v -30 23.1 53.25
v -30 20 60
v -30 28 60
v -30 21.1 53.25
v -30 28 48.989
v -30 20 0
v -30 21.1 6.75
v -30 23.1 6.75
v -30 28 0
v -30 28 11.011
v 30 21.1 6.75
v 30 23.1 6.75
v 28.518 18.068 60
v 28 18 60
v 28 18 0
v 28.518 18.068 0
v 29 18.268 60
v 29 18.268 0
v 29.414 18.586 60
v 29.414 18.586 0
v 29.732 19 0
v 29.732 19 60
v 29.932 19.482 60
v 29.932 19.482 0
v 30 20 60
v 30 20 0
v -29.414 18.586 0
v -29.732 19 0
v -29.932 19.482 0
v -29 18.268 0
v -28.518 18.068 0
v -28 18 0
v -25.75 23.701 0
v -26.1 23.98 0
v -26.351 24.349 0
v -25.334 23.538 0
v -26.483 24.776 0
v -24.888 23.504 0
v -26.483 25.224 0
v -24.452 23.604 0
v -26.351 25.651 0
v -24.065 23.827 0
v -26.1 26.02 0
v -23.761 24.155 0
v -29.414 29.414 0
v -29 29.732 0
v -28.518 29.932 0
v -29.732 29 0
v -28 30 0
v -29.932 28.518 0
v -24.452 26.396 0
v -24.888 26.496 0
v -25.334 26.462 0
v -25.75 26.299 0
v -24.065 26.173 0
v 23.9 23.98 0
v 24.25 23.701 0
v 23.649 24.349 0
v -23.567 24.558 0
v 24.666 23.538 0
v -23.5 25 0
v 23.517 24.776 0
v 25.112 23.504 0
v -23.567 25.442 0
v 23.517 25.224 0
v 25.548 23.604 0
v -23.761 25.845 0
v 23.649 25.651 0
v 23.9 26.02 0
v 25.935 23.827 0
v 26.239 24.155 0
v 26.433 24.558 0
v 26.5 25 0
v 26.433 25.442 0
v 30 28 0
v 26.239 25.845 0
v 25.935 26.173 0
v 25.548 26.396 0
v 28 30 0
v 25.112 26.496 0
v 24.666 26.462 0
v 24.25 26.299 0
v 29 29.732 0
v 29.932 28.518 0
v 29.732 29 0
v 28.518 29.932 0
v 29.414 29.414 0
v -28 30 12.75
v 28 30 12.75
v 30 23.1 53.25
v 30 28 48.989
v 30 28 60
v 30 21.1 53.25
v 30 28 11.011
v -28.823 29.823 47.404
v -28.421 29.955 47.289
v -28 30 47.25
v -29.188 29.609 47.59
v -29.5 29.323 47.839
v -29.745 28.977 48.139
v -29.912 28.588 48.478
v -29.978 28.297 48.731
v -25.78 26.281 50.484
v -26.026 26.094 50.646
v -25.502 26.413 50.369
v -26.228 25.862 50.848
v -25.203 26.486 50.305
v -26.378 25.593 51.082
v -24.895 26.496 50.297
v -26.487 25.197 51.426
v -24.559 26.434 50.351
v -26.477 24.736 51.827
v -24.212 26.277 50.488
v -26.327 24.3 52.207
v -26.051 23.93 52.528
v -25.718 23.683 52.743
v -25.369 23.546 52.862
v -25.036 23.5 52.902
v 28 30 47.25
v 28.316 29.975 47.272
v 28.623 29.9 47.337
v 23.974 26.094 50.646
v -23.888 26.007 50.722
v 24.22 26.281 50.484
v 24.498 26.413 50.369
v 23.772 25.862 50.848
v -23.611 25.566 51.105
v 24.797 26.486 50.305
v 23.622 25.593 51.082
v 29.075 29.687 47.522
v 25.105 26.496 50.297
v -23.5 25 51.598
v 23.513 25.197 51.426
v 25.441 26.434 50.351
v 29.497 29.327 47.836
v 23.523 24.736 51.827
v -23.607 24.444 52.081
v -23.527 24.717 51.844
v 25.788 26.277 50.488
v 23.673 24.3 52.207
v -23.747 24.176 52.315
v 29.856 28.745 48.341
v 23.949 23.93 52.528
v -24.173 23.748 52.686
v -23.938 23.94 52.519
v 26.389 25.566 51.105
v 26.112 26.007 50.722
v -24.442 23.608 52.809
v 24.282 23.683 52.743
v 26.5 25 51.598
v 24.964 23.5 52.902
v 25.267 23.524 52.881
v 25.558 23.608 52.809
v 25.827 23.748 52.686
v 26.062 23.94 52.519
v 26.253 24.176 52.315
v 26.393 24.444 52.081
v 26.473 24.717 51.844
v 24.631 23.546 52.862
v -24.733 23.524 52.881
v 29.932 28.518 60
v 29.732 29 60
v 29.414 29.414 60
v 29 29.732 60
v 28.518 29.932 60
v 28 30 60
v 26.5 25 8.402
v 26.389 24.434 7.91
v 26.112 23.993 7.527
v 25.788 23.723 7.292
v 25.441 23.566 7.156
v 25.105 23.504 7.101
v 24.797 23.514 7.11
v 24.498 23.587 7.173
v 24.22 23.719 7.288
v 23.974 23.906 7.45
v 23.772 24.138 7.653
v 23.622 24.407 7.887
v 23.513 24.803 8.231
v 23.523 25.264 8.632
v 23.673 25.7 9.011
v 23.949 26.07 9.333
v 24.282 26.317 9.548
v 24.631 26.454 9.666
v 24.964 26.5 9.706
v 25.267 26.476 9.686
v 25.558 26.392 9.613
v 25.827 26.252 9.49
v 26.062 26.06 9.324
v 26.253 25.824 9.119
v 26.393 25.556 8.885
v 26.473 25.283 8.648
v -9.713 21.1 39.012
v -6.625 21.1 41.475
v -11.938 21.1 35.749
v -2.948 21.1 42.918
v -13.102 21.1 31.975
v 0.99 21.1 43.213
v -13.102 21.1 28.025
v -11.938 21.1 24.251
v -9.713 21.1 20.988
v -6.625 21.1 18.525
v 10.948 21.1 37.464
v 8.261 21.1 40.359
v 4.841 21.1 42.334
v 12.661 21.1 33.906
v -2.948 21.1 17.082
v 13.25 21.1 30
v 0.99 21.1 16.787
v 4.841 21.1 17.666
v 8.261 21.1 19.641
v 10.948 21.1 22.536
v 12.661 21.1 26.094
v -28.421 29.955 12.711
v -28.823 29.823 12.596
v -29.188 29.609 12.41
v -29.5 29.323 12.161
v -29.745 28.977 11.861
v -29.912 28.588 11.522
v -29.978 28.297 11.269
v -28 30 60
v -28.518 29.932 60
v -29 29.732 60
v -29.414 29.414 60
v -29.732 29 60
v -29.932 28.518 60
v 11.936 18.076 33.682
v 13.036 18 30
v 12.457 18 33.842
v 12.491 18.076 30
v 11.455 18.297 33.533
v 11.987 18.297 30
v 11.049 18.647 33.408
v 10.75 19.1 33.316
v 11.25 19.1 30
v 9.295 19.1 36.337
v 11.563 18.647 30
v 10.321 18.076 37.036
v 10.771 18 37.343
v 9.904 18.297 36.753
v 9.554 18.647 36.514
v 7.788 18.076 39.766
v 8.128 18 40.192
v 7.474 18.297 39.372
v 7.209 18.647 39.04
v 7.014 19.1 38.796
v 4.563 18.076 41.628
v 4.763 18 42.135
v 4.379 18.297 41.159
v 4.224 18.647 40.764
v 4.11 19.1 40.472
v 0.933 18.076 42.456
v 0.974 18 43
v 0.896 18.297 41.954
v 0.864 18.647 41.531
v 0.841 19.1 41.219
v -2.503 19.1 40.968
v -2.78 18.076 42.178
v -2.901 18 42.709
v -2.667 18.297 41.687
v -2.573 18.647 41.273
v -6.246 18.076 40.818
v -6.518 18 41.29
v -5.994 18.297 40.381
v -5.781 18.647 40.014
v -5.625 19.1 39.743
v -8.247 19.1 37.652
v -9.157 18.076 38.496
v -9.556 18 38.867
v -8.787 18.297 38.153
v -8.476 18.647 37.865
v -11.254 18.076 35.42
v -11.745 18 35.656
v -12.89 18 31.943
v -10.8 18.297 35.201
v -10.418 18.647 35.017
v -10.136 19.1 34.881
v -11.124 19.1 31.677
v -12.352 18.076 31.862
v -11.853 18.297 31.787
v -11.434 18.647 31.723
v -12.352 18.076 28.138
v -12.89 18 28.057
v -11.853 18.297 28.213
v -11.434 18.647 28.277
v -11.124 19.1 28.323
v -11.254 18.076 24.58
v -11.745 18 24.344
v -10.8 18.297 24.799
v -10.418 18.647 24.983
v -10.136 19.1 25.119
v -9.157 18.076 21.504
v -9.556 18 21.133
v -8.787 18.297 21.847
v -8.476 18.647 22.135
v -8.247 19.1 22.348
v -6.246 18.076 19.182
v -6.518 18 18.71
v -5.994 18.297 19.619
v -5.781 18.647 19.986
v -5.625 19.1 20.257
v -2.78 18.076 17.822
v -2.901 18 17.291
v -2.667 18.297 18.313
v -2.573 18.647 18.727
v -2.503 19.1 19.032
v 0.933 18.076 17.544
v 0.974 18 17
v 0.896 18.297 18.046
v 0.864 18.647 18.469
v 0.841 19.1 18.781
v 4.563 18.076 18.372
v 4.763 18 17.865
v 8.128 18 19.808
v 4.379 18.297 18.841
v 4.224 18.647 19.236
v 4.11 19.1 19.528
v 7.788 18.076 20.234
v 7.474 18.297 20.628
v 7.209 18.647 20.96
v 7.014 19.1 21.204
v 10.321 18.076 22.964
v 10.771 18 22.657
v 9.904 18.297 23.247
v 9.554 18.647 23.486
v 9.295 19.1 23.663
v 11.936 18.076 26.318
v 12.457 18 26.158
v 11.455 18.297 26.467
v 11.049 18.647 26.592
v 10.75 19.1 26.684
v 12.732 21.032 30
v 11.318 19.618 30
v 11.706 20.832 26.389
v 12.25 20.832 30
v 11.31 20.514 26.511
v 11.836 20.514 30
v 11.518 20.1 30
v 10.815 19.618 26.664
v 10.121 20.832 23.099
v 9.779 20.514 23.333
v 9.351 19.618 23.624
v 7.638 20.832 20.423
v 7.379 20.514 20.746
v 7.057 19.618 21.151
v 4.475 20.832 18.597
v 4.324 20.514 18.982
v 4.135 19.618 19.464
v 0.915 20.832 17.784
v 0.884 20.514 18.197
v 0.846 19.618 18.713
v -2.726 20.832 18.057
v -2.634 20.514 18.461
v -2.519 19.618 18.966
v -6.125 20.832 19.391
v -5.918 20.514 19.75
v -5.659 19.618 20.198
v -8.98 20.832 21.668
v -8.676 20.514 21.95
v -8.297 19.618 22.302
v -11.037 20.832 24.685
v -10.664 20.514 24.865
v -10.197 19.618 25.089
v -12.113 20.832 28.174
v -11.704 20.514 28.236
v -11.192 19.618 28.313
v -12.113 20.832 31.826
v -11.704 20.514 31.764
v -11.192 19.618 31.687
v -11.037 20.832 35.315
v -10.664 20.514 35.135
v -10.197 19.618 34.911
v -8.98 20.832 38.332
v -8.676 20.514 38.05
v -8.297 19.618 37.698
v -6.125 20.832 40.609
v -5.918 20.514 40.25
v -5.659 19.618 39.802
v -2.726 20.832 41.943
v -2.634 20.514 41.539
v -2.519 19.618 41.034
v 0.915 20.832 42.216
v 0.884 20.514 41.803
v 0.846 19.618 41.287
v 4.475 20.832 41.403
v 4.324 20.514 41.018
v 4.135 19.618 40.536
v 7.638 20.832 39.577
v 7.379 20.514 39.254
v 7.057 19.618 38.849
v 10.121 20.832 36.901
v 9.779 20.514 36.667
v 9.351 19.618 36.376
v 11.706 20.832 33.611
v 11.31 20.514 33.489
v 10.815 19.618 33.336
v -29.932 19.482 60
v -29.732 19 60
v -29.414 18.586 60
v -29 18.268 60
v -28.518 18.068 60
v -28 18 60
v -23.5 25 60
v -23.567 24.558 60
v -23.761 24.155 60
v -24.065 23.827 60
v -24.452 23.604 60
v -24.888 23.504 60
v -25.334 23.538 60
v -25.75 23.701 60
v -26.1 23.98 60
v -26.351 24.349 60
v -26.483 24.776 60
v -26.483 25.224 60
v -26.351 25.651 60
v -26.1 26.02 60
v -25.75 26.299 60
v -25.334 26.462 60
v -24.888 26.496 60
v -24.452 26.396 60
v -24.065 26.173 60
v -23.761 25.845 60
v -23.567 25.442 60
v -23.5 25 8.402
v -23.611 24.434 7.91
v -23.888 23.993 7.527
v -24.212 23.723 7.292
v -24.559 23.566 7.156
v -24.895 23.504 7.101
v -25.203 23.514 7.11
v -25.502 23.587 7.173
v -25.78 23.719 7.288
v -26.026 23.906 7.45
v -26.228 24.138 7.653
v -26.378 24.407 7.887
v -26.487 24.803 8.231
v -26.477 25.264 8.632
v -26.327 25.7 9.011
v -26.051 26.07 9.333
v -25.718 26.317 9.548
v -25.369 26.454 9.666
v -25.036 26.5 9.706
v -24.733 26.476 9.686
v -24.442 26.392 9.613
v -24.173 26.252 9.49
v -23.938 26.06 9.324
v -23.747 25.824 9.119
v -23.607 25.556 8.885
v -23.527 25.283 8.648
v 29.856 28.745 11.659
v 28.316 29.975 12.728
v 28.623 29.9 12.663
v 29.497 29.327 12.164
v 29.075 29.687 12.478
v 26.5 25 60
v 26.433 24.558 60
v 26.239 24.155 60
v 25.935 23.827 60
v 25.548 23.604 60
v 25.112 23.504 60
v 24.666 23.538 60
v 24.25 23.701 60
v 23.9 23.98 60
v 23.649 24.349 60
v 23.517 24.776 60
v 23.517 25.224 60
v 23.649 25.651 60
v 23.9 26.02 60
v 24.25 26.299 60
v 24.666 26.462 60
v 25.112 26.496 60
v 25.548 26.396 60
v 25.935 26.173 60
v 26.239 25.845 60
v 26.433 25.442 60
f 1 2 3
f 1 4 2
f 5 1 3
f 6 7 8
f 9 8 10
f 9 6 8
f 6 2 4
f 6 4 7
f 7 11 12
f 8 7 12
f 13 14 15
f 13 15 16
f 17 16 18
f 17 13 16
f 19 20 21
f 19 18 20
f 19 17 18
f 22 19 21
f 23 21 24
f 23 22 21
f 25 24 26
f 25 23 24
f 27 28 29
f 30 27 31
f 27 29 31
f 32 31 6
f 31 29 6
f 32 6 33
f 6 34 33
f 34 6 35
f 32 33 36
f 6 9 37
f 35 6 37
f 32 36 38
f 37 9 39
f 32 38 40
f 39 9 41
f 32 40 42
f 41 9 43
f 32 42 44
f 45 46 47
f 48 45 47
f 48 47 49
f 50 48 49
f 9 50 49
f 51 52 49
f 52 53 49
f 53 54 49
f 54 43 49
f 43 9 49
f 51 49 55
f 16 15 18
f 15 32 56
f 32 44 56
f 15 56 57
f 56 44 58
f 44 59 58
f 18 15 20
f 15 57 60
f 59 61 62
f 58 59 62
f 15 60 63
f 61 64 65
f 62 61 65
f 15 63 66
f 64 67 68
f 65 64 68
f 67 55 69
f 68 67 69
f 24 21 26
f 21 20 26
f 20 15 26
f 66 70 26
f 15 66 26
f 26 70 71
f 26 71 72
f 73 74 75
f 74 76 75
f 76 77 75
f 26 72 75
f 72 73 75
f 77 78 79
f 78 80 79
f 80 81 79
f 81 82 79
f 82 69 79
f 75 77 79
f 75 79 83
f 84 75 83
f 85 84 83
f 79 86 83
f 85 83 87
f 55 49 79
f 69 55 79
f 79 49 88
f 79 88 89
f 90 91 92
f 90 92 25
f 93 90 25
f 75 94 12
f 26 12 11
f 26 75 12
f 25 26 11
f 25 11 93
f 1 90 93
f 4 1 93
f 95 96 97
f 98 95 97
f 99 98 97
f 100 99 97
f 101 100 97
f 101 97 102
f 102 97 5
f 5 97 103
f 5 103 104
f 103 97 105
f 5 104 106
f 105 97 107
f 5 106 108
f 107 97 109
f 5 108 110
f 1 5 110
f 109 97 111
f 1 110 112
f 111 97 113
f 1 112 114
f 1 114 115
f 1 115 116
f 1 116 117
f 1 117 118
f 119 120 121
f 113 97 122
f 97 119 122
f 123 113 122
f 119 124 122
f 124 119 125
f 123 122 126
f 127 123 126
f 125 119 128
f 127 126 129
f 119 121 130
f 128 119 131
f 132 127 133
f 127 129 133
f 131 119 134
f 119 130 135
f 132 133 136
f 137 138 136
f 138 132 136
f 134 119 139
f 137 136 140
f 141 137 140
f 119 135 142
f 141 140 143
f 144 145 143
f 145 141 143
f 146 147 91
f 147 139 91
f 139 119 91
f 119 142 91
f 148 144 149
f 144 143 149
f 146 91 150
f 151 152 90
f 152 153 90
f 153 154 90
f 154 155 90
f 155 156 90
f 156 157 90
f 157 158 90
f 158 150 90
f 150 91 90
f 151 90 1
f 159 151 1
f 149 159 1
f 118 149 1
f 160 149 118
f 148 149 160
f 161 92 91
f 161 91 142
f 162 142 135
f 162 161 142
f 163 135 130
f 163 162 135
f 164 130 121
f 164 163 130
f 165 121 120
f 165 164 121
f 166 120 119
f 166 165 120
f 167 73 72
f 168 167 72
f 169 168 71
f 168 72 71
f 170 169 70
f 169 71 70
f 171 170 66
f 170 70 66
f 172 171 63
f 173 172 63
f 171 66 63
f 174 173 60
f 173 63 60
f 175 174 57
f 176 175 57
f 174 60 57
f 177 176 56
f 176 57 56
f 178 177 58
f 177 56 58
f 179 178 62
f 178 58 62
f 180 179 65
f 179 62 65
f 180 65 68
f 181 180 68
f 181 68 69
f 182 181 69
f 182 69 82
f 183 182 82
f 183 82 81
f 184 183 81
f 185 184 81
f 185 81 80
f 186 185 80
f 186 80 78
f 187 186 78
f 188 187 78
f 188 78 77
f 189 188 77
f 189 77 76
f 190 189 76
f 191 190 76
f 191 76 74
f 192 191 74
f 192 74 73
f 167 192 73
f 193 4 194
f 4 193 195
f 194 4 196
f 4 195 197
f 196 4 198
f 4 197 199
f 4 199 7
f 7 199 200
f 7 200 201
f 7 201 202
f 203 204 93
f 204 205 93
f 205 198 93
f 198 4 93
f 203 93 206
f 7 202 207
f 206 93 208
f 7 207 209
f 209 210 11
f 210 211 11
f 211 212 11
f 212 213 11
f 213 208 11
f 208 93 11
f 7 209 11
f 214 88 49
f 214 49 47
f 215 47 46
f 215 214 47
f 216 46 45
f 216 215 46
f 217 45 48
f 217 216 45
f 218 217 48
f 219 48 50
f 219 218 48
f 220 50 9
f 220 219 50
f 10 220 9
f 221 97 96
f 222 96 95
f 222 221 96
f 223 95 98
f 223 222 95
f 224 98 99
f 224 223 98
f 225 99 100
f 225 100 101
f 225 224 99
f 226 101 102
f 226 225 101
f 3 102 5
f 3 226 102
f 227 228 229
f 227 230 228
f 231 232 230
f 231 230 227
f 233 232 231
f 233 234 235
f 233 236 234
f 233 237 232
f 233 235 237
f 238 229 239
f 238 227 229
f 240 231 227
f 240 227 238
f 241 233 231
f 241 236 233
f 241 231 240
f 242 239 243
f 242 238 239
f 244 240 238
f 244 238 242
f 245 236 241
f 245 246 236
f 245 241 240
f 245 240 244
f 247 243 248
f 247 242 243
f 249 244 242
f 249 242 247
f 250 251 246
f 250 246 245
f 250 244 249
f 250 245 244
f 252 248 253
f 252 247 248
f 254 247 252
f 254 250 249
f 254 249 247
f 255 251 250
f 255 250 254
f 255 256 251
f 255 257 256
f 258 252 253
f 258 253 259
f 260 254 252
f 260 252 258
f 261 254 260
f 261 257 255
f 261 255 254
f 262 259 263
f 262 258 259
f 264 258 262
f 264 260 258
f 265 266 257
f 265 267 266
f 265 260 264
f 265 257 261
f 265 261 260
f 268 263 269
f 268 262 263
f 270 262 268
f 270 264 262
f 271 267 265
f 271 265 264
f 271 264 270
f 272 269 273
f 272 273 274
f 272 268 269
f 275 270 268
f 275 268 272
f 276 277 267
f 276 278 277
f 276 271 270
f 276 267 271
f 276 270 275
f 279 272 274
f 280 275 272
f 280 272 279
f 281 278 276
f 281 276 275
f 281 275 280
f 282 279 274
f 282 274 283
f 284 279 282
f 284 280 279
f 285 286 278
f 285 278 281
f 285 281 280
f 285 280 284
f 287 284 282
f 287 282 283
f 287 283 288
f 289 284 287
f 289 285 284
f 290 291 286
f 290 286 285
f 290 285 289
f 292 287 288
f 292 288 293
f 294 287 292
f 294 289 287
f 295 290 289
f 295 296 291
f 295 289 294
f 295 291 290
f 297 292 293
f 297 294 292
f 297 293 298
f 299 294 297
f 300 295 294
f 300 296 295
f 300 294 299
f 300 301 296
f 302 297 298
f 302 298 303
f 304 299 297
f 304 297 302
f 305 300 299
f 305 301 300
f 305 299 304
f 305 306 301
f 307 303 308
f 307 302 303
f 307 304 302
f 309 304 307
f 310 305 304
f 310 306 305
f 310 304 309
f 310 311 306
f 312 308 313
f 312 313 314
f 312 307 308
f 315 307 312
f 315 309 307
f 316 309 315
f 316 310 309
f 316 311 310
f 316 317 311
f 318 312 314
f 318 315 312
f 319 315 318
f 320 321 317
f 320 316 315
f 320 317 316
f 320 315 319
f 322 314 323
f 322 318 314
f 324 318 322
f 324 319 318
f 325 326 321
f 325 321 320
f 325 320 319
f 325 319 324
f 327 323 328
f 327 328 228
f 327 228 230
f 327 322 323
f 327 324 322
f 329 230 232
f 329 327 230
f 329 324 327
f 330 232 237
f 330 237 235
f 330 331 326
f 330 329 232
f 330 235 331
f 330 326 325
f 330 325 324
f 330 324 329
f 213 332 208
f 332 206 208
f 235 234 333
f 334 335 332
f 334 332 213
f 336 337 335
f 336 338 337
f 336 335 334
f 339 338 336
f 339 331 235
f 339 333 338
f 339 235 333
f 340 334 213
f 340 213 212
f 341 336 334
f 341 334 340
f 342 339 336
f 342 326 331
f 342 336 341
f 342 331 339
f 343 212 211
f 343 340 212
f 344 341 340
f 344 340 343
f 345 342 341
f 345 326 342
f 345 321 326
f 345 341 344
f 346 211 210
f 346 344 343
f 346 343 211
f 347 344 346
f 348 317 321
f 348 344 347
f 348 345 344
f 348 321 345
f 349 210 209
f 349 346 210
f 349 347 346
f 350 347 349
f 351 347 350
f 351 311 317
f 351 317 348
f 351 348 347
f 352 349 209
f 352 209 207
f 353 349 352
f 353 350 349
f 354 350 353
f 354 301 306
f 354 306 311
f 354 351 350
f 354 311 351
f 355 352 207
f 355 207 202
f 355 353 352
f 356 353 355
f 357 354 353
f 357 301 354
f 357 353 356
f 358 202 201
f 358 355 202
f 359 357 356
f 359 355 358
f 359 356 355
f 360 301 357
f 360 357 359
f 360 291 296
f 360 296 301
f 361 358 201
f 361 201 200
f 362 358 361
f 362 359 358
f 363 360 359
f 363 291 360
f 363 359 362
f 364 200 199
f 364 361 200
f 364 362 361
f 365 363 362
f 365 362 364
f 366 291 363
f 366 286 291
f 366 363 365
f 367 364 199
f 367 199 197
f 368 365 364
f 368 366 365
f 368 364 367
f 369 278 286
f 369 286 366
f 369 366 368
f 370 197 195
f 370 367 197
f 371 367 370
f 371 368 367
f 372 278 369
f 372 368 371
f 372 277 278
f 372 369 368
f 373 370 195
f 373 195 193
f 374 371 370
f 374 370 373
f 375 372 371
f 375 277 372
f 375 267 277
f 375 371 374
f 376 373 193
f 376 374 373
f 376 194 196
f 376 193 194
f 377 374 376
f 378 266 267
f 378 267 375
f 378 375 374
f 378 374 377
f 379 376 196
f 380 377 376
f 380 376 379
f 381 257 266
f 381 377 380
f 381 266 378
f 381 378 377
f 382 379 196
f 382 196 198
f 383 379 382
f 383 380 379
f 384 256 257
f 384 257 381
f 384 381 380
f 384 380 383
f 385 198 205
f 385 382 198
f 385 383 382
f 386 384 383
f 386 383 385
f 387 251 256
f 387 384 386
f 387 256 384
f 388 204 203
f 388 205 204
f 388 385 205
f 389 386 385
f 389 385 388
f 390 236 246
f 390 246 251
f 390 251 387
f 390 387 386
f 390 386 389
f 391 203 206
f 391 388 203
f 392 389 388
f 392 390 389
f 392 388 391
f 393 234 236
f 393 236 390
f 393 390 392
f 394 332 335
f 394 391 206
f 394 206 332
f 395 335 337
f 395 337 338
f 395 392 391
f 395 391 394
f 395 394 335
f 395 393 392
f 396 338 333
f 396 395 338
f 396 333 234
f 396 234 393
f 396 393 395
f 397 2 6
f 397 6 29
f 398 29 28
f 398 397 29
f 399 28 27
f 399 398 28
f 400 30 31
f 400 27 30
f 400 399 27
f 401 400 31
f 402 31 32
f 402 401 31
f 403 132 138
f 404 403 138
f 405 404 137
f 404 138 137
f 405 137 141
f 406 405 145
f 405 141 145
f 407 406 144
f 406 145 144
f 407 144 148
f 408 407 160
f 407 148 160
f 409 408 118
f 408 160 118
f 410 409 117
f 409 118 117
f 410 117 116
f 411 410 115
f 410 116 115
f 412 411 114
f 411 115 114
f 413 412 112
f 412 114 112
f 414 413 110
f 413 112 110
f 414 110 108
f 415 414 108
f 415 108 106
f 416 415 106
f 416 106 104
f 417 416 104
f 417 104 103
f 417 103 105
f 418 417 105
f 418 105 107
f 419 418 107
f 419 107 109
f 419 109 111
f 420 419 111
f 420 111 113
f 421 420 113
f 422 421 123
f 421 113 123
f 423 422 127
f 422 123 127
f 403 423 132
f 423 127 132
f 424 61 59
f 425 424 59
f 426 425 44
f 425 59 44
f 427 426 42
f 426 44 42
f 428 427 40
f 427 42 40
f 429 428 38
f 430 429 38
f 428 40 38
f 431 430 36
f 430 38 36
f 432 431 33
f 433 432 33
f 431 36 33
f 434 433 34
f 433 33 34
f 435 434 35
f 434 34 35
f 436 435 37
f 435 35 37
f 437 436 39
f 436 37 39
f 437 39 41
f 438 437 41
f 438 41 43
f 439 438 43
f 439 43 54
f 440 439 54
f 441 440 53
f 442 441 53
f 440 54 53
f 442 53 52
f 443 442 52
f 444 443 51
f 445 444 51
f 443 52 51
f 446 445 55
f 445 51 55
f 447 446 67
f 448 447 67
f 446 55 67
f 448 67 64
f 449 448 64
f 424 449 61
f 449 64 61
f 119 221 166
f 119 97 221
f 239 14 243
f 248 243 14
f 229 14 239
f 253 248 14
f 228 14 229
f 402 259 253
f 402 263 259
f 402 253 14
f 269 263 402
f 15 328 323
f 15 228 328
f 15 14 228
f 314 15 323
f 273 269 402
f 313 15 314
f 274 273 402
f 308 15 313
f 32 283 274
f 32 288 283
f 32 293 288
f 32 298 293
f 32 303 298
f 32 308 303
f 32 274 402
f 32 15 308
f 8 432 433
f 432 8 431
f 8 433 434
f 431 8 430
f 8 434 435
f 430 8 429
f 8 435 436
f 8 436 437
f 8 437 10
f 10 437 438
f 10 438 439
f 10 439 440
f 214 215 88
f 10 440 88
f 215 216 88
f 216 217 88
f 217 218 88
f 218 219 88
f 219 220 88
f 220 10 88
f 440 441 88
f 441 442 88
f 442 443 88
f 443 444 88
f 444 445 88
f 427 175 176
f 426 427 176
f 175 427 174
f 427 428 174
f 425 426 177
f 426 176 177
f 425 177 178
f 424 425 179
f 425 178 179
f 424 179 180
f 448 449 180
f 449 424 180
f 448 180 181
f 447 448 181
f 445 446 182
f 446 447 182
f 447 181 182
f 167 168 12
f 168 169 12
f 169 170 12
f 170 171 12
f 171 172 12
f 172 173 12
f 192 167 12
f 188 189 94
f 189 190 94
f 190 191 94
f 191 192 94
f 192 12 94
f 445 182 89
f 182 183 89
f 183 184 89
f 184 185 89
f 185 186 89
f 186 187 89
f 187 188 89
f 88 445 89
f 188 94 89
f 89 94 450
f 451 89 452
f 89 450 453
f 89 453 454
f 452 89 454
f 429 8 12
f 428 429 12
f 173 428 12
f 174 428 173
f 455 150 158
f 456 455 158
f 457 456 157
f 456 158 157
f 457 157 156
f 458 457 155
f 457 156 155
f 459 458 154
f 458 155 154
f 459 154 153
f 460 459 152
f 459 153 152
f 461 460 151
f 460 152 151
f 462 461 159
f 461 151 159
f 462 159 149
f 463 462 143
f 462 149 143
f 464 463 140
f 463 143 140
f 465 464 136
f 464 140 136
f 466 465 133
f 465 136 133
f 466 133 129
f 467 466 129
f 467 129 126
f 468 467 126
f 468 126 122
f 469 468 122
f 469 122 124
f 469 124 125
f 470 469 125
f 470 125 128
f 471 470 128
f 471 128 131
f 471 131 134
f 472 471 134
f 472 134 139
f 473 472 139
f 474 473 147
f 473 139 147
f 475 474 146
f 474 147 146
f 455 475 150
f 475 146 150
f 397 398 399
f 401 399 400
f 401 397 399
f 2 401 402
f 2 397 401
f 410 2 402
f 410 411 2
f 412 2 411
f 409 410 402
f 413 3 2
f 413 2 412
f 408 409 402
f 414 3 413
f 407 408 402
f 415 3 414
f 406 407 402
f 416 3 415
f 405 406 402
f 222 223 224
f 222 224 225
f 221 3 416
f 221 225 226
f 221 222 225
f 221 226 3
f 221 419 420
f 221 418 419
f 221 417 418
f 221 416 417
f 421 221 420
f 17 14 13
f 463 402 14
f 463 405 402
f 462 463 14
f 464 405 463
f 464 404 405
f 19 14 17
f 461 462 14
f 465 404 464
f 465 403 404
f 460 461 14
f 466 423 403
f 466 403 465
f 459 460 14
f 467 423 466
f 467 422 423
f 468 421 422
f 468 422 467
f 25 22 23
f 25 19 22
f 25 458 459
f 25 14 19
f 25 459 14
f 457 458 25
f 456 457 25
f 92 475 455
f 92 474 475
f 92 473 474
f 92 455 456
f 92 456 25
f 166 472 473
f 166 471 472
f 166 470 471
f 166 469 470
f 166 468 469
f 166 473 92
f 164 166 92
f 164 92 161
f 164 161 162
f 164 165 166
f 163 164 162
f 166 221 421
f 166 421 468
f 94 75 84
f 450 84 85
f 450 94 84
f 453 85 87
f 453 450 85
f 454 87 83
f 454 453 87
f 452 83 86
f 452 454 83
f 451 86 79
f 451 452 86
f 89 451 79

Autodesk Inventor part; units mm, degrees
ref_plane "YZ Plane" through (0, 0, 0) normal (1, 0, 0) x (0, 1, 0)
ref_plane "XZ Plane" through (0, 0, 0) normal (0, 1, 0) x (-1, 0, 0)
ref_plane "XY Plane" through (0, 0, 0) normal (0, 0, 1) x (1, 0, 0)
sketch "Sketch1" plane through (0, 0, 0) normal (0, 0, 1) x (1, 0, 0)
  line L0 (30, -30) -> (30, 30)
  line L1 (30, 30) -> (-30, 30)
  line L2 (-30, 30) -> (-30, -30)
  line L3 (-30, -30) -> (30, 30) construction
  line L4 (30, -30) -> (-30, 30) construction
  line L5 (30, 30) -> (25, 30) construction
  line L6 (25, 30) -> (25, 25) construction
  line L7 (-30, 30) -> (-25, 30) construction
  line L8 (-25, 30) -> (-25, 25) construction
  line L9 (-30, -30) -> (-30, -25) construction
  line L10 (-30, -25) -> (-25, -25) construction
  line L11 (30, -30) -> (30, -25) construction
  line L12 (30, -25) -> (25, -25) construction
  circle A0 centre (-25, 25) radius 1.5
  circle A1 centre (25, 25) radius 1.5
  circle A2 centre (25, -25) radius 1.5
  circle A3 centre (-25, -25) radius 1.5
  line L13 (30, 30) -> (30, 18) construction
  line L14 (30, 18) -> (-30, 18)
  point P0 (0, 0)
  dimension "d0" = 60
  dimension "d1" = 60
  dimension "d2" = 5
  dimension "d3" = 5
  dimension "d4" = 5
  dimension "d5" = 5
  dimension "d6" = 5
  dimension "d7" = 5
  dimension "d8" = 5
  dimension "d9" = 5
  dimension "d10" = 3
  dimension "d11" = 3
  dimension "d12" = 3
  dimension "d13" = 3
  dimension "d46" = 12
sketch "Sketch1 outline for Block" plane through (0, 0, 0) normal (0, 0, 1) x (1, 0, 0)
  line L0 (30, 30) -> (30, 18)
  line L1 (-30, 30) -> (30, 30)
  line L2 (30, 18) -> (-30, 18)
  line L3 (-30, 18) -> (-30, 30)
  circle A0 centre (-25, 25) radius 1.5
  circle A1 centre (25, 25) radius 1.5
extrude "Block" add sketch "Sketch1 outline for Block" along normal blind 60
sketch "Sketch2" plane through (30, -30, 0) normal (1, 0, 0) x (0, 0, -1)
  line L0 (0, 60) -> (-60, 60) projected
  line L1 (-30, 60) -> (-12.75, 60)
  line L2 (-30, 60) -> (-47.25, 60)
  line L3 (-30, 60) -> (-30, 51.1) construction
  line L4 (-30, 51.1) -> (-6.75, 51.1)
  line L5 (-30, 51.1) -> (-53.25, 51.1)
  line L6 (-53.25, 51.1) -> (-53.25, 53.1)
  line L7 (-6.75, 51.1) -> (-6.75, 53.1)
  line L8 (-6.75, 53.1) -> (-12.75, 60)
  line L9 (-53.25, 53.1) -> (-47.25, 60)
  point P0 (0, 30)
  dimension "d17" = 17.25
  dimension "d18" = 17.25
  dimension "d19" = 8.9
  dimension "d20" = 23.25
  dimension "d21" = 23.25
  dimension "d22" = 2
  dimension "d23" = 2
sketch "Sketch2 outline for Tripod Slot" plane through (30, -30, 0) normal (1, 0, 0) x (0, 0, -1)
  line L0 (-12.75, 60) -> (-30, 60)
  line L1 (-6.75, 53.1) -> (-12.75, 60)
  line L2 (-6.75, 51.1) -> (-6.75, 53.1)
  line L3 (-30, 51.1) -> (-6.75, 51.1)
  line L4 (-53.25, 51.1) -> (-30, 51.1)
  line L5 (-53.25, 53.1) -> (-53.25, 51.1)
  line L6 (-47.25, 60) -> (-53.25, 53.1)
  line L7 (-30, 60) -> (-47.25, 60)
extrude "Tripod Slot" cut sketch "Sketch2 outline for Tripod Slot" against normal blind 60
sketch "Sketch3" plane through (0, 0, 60) normal (0, 0, 1) x (1, 0, 0)
  circle A0 centre (-25, -25) radius 1.5 construction
  line L0 (-25, -25) -> (-25, -20) construction
  line L1 (-25, -25) -> (-20, -25) construction
  line L2 (25.138807, -25) -> (25.138807, -20) construction
  line L3 (25.138807, -25) -> (30.138807, -25) construction
  line L4 (-25, 24.966147) -> (-25, 17.466147) construction
  line L5 (-25, 24.966147) -> (-17.5, 24.966147) construction
  line L6 (25.138807, 24.966147) -> (25.138807, 17.466147) construction
  line L7 (25.138807, 24.966147) -> (32.638807, 24.966147) construction
  line L8 (25.138807, 17.466147) -> (30, 17.466147) construction
  line L9 (30, 30) -> (30, 18) construction
  line L10 (-25, 17.466147) -> (-30, 17.466147) construction
  line L11 (-30, 30) -> (-30, 18) construction
  line L12 (-25, -20) -> (-30, -20) construction
  line L13 (25.138807, -20) -> (30, -20) construction
  line L14 (30, 17.466147) -> (5, 17.466147)
  line L15 (30, -20) -> (5, -20)
  line L16 (5, -20) -> (5, 17.466147)
  line L17 (-30, 17.466147) -> (-5, 17.466147)
  line L18 (-30, -20) -> (-5, -20)
  line L19 (-5, -20) -> (-5, 17.466147)
  line L20 (-30, 17.466147) -> (-30, -20)
  line L21 (30, 17.466147) -> (30, -20)
  point P0 (0, 0)
  point P1 (30, -30)
  point P2 (-30, -30)
  dimension "d26" = 5
  dimension "d27" = 90
  dimension "d28" = 5
  dimension "d29" = 90
  dimension "d30" = 7.5
  dimension "d31" = 90
  dimension "d32" = 7.5
  dimension "d33" = 90
  dimension "d34" = 25
  dimension "d35" = 25
  dimension "d36" = 25
  dimension "d37" = 25
  dimension "d38" = 90
  dimension "d39" = 90
  dimension "d40" = 4.86119
  dimension "d41" = 4.86119
  dimension "d42" = 55
sketch "Sketch3 outline for Plastic Thinning" plane through (0, 0, 60) normal (0, 0, 1) x (1, 0, 0)
  line L0 (30, -20) -> (30, 17.466147)
  line L1 (5, -20) -> (30, -20)
  line L2 (5, 17.466147) -> (5, -20)
  line L3 (30, 17.466147) -> (5, 17.466147)
  line L4 (-30, 17.466147) -> (-5, 17.466147)
  line L5 (-5, 17.466147) -> (-5, -20)
  line L6 (-5, -20) -> (-30, -20)
  line L7 (-30, -20) -> (-30, 17.466147)
extrude "Plastic Thinning" cut sketch "Sketch3 outline for Plastic Thinning" against normal blind 60
fillet "Strength" [suppressed]
fillet "Fillet3" radius 2 6 edges at (30, 18, 30) (30, 30, 6.375) (30, 30, 53.625) (-30, 18, 30) (-30, 30, 6.375) (-30, 30, 53.625)
sketch "Sketch4" plane through (-28, 18, 0) normal (0, -1, 0) x (1, 0, 0)
  line L0 (56, 60) -> (0, 60) construction
  line L1 (0, 0) -> (56, 0) construction
  line L2 (0, 60) -> (56, 0) construction
  circle A0 centre (28, 30) radius 11.25
  point P0 (28, 0)
  dimension "d48" = 22.5
sketch "Sketch4 outline for Extrusion4" plane through (-28, 18, 0) normal (0, -1, 0) x (1, 0, 0)
  circle A0 centre (28, 30) radius 11.25
extrude "Extrusion4" cut sketch "Sketch4 outline for Extrusion4" against normal blind 12.25
fillet "Fillet4" radius 2 2 edges at (-11.25, 21.1, 30) (-11.25, 18, 30)
properties part number "60x60CameraMountSlim"
